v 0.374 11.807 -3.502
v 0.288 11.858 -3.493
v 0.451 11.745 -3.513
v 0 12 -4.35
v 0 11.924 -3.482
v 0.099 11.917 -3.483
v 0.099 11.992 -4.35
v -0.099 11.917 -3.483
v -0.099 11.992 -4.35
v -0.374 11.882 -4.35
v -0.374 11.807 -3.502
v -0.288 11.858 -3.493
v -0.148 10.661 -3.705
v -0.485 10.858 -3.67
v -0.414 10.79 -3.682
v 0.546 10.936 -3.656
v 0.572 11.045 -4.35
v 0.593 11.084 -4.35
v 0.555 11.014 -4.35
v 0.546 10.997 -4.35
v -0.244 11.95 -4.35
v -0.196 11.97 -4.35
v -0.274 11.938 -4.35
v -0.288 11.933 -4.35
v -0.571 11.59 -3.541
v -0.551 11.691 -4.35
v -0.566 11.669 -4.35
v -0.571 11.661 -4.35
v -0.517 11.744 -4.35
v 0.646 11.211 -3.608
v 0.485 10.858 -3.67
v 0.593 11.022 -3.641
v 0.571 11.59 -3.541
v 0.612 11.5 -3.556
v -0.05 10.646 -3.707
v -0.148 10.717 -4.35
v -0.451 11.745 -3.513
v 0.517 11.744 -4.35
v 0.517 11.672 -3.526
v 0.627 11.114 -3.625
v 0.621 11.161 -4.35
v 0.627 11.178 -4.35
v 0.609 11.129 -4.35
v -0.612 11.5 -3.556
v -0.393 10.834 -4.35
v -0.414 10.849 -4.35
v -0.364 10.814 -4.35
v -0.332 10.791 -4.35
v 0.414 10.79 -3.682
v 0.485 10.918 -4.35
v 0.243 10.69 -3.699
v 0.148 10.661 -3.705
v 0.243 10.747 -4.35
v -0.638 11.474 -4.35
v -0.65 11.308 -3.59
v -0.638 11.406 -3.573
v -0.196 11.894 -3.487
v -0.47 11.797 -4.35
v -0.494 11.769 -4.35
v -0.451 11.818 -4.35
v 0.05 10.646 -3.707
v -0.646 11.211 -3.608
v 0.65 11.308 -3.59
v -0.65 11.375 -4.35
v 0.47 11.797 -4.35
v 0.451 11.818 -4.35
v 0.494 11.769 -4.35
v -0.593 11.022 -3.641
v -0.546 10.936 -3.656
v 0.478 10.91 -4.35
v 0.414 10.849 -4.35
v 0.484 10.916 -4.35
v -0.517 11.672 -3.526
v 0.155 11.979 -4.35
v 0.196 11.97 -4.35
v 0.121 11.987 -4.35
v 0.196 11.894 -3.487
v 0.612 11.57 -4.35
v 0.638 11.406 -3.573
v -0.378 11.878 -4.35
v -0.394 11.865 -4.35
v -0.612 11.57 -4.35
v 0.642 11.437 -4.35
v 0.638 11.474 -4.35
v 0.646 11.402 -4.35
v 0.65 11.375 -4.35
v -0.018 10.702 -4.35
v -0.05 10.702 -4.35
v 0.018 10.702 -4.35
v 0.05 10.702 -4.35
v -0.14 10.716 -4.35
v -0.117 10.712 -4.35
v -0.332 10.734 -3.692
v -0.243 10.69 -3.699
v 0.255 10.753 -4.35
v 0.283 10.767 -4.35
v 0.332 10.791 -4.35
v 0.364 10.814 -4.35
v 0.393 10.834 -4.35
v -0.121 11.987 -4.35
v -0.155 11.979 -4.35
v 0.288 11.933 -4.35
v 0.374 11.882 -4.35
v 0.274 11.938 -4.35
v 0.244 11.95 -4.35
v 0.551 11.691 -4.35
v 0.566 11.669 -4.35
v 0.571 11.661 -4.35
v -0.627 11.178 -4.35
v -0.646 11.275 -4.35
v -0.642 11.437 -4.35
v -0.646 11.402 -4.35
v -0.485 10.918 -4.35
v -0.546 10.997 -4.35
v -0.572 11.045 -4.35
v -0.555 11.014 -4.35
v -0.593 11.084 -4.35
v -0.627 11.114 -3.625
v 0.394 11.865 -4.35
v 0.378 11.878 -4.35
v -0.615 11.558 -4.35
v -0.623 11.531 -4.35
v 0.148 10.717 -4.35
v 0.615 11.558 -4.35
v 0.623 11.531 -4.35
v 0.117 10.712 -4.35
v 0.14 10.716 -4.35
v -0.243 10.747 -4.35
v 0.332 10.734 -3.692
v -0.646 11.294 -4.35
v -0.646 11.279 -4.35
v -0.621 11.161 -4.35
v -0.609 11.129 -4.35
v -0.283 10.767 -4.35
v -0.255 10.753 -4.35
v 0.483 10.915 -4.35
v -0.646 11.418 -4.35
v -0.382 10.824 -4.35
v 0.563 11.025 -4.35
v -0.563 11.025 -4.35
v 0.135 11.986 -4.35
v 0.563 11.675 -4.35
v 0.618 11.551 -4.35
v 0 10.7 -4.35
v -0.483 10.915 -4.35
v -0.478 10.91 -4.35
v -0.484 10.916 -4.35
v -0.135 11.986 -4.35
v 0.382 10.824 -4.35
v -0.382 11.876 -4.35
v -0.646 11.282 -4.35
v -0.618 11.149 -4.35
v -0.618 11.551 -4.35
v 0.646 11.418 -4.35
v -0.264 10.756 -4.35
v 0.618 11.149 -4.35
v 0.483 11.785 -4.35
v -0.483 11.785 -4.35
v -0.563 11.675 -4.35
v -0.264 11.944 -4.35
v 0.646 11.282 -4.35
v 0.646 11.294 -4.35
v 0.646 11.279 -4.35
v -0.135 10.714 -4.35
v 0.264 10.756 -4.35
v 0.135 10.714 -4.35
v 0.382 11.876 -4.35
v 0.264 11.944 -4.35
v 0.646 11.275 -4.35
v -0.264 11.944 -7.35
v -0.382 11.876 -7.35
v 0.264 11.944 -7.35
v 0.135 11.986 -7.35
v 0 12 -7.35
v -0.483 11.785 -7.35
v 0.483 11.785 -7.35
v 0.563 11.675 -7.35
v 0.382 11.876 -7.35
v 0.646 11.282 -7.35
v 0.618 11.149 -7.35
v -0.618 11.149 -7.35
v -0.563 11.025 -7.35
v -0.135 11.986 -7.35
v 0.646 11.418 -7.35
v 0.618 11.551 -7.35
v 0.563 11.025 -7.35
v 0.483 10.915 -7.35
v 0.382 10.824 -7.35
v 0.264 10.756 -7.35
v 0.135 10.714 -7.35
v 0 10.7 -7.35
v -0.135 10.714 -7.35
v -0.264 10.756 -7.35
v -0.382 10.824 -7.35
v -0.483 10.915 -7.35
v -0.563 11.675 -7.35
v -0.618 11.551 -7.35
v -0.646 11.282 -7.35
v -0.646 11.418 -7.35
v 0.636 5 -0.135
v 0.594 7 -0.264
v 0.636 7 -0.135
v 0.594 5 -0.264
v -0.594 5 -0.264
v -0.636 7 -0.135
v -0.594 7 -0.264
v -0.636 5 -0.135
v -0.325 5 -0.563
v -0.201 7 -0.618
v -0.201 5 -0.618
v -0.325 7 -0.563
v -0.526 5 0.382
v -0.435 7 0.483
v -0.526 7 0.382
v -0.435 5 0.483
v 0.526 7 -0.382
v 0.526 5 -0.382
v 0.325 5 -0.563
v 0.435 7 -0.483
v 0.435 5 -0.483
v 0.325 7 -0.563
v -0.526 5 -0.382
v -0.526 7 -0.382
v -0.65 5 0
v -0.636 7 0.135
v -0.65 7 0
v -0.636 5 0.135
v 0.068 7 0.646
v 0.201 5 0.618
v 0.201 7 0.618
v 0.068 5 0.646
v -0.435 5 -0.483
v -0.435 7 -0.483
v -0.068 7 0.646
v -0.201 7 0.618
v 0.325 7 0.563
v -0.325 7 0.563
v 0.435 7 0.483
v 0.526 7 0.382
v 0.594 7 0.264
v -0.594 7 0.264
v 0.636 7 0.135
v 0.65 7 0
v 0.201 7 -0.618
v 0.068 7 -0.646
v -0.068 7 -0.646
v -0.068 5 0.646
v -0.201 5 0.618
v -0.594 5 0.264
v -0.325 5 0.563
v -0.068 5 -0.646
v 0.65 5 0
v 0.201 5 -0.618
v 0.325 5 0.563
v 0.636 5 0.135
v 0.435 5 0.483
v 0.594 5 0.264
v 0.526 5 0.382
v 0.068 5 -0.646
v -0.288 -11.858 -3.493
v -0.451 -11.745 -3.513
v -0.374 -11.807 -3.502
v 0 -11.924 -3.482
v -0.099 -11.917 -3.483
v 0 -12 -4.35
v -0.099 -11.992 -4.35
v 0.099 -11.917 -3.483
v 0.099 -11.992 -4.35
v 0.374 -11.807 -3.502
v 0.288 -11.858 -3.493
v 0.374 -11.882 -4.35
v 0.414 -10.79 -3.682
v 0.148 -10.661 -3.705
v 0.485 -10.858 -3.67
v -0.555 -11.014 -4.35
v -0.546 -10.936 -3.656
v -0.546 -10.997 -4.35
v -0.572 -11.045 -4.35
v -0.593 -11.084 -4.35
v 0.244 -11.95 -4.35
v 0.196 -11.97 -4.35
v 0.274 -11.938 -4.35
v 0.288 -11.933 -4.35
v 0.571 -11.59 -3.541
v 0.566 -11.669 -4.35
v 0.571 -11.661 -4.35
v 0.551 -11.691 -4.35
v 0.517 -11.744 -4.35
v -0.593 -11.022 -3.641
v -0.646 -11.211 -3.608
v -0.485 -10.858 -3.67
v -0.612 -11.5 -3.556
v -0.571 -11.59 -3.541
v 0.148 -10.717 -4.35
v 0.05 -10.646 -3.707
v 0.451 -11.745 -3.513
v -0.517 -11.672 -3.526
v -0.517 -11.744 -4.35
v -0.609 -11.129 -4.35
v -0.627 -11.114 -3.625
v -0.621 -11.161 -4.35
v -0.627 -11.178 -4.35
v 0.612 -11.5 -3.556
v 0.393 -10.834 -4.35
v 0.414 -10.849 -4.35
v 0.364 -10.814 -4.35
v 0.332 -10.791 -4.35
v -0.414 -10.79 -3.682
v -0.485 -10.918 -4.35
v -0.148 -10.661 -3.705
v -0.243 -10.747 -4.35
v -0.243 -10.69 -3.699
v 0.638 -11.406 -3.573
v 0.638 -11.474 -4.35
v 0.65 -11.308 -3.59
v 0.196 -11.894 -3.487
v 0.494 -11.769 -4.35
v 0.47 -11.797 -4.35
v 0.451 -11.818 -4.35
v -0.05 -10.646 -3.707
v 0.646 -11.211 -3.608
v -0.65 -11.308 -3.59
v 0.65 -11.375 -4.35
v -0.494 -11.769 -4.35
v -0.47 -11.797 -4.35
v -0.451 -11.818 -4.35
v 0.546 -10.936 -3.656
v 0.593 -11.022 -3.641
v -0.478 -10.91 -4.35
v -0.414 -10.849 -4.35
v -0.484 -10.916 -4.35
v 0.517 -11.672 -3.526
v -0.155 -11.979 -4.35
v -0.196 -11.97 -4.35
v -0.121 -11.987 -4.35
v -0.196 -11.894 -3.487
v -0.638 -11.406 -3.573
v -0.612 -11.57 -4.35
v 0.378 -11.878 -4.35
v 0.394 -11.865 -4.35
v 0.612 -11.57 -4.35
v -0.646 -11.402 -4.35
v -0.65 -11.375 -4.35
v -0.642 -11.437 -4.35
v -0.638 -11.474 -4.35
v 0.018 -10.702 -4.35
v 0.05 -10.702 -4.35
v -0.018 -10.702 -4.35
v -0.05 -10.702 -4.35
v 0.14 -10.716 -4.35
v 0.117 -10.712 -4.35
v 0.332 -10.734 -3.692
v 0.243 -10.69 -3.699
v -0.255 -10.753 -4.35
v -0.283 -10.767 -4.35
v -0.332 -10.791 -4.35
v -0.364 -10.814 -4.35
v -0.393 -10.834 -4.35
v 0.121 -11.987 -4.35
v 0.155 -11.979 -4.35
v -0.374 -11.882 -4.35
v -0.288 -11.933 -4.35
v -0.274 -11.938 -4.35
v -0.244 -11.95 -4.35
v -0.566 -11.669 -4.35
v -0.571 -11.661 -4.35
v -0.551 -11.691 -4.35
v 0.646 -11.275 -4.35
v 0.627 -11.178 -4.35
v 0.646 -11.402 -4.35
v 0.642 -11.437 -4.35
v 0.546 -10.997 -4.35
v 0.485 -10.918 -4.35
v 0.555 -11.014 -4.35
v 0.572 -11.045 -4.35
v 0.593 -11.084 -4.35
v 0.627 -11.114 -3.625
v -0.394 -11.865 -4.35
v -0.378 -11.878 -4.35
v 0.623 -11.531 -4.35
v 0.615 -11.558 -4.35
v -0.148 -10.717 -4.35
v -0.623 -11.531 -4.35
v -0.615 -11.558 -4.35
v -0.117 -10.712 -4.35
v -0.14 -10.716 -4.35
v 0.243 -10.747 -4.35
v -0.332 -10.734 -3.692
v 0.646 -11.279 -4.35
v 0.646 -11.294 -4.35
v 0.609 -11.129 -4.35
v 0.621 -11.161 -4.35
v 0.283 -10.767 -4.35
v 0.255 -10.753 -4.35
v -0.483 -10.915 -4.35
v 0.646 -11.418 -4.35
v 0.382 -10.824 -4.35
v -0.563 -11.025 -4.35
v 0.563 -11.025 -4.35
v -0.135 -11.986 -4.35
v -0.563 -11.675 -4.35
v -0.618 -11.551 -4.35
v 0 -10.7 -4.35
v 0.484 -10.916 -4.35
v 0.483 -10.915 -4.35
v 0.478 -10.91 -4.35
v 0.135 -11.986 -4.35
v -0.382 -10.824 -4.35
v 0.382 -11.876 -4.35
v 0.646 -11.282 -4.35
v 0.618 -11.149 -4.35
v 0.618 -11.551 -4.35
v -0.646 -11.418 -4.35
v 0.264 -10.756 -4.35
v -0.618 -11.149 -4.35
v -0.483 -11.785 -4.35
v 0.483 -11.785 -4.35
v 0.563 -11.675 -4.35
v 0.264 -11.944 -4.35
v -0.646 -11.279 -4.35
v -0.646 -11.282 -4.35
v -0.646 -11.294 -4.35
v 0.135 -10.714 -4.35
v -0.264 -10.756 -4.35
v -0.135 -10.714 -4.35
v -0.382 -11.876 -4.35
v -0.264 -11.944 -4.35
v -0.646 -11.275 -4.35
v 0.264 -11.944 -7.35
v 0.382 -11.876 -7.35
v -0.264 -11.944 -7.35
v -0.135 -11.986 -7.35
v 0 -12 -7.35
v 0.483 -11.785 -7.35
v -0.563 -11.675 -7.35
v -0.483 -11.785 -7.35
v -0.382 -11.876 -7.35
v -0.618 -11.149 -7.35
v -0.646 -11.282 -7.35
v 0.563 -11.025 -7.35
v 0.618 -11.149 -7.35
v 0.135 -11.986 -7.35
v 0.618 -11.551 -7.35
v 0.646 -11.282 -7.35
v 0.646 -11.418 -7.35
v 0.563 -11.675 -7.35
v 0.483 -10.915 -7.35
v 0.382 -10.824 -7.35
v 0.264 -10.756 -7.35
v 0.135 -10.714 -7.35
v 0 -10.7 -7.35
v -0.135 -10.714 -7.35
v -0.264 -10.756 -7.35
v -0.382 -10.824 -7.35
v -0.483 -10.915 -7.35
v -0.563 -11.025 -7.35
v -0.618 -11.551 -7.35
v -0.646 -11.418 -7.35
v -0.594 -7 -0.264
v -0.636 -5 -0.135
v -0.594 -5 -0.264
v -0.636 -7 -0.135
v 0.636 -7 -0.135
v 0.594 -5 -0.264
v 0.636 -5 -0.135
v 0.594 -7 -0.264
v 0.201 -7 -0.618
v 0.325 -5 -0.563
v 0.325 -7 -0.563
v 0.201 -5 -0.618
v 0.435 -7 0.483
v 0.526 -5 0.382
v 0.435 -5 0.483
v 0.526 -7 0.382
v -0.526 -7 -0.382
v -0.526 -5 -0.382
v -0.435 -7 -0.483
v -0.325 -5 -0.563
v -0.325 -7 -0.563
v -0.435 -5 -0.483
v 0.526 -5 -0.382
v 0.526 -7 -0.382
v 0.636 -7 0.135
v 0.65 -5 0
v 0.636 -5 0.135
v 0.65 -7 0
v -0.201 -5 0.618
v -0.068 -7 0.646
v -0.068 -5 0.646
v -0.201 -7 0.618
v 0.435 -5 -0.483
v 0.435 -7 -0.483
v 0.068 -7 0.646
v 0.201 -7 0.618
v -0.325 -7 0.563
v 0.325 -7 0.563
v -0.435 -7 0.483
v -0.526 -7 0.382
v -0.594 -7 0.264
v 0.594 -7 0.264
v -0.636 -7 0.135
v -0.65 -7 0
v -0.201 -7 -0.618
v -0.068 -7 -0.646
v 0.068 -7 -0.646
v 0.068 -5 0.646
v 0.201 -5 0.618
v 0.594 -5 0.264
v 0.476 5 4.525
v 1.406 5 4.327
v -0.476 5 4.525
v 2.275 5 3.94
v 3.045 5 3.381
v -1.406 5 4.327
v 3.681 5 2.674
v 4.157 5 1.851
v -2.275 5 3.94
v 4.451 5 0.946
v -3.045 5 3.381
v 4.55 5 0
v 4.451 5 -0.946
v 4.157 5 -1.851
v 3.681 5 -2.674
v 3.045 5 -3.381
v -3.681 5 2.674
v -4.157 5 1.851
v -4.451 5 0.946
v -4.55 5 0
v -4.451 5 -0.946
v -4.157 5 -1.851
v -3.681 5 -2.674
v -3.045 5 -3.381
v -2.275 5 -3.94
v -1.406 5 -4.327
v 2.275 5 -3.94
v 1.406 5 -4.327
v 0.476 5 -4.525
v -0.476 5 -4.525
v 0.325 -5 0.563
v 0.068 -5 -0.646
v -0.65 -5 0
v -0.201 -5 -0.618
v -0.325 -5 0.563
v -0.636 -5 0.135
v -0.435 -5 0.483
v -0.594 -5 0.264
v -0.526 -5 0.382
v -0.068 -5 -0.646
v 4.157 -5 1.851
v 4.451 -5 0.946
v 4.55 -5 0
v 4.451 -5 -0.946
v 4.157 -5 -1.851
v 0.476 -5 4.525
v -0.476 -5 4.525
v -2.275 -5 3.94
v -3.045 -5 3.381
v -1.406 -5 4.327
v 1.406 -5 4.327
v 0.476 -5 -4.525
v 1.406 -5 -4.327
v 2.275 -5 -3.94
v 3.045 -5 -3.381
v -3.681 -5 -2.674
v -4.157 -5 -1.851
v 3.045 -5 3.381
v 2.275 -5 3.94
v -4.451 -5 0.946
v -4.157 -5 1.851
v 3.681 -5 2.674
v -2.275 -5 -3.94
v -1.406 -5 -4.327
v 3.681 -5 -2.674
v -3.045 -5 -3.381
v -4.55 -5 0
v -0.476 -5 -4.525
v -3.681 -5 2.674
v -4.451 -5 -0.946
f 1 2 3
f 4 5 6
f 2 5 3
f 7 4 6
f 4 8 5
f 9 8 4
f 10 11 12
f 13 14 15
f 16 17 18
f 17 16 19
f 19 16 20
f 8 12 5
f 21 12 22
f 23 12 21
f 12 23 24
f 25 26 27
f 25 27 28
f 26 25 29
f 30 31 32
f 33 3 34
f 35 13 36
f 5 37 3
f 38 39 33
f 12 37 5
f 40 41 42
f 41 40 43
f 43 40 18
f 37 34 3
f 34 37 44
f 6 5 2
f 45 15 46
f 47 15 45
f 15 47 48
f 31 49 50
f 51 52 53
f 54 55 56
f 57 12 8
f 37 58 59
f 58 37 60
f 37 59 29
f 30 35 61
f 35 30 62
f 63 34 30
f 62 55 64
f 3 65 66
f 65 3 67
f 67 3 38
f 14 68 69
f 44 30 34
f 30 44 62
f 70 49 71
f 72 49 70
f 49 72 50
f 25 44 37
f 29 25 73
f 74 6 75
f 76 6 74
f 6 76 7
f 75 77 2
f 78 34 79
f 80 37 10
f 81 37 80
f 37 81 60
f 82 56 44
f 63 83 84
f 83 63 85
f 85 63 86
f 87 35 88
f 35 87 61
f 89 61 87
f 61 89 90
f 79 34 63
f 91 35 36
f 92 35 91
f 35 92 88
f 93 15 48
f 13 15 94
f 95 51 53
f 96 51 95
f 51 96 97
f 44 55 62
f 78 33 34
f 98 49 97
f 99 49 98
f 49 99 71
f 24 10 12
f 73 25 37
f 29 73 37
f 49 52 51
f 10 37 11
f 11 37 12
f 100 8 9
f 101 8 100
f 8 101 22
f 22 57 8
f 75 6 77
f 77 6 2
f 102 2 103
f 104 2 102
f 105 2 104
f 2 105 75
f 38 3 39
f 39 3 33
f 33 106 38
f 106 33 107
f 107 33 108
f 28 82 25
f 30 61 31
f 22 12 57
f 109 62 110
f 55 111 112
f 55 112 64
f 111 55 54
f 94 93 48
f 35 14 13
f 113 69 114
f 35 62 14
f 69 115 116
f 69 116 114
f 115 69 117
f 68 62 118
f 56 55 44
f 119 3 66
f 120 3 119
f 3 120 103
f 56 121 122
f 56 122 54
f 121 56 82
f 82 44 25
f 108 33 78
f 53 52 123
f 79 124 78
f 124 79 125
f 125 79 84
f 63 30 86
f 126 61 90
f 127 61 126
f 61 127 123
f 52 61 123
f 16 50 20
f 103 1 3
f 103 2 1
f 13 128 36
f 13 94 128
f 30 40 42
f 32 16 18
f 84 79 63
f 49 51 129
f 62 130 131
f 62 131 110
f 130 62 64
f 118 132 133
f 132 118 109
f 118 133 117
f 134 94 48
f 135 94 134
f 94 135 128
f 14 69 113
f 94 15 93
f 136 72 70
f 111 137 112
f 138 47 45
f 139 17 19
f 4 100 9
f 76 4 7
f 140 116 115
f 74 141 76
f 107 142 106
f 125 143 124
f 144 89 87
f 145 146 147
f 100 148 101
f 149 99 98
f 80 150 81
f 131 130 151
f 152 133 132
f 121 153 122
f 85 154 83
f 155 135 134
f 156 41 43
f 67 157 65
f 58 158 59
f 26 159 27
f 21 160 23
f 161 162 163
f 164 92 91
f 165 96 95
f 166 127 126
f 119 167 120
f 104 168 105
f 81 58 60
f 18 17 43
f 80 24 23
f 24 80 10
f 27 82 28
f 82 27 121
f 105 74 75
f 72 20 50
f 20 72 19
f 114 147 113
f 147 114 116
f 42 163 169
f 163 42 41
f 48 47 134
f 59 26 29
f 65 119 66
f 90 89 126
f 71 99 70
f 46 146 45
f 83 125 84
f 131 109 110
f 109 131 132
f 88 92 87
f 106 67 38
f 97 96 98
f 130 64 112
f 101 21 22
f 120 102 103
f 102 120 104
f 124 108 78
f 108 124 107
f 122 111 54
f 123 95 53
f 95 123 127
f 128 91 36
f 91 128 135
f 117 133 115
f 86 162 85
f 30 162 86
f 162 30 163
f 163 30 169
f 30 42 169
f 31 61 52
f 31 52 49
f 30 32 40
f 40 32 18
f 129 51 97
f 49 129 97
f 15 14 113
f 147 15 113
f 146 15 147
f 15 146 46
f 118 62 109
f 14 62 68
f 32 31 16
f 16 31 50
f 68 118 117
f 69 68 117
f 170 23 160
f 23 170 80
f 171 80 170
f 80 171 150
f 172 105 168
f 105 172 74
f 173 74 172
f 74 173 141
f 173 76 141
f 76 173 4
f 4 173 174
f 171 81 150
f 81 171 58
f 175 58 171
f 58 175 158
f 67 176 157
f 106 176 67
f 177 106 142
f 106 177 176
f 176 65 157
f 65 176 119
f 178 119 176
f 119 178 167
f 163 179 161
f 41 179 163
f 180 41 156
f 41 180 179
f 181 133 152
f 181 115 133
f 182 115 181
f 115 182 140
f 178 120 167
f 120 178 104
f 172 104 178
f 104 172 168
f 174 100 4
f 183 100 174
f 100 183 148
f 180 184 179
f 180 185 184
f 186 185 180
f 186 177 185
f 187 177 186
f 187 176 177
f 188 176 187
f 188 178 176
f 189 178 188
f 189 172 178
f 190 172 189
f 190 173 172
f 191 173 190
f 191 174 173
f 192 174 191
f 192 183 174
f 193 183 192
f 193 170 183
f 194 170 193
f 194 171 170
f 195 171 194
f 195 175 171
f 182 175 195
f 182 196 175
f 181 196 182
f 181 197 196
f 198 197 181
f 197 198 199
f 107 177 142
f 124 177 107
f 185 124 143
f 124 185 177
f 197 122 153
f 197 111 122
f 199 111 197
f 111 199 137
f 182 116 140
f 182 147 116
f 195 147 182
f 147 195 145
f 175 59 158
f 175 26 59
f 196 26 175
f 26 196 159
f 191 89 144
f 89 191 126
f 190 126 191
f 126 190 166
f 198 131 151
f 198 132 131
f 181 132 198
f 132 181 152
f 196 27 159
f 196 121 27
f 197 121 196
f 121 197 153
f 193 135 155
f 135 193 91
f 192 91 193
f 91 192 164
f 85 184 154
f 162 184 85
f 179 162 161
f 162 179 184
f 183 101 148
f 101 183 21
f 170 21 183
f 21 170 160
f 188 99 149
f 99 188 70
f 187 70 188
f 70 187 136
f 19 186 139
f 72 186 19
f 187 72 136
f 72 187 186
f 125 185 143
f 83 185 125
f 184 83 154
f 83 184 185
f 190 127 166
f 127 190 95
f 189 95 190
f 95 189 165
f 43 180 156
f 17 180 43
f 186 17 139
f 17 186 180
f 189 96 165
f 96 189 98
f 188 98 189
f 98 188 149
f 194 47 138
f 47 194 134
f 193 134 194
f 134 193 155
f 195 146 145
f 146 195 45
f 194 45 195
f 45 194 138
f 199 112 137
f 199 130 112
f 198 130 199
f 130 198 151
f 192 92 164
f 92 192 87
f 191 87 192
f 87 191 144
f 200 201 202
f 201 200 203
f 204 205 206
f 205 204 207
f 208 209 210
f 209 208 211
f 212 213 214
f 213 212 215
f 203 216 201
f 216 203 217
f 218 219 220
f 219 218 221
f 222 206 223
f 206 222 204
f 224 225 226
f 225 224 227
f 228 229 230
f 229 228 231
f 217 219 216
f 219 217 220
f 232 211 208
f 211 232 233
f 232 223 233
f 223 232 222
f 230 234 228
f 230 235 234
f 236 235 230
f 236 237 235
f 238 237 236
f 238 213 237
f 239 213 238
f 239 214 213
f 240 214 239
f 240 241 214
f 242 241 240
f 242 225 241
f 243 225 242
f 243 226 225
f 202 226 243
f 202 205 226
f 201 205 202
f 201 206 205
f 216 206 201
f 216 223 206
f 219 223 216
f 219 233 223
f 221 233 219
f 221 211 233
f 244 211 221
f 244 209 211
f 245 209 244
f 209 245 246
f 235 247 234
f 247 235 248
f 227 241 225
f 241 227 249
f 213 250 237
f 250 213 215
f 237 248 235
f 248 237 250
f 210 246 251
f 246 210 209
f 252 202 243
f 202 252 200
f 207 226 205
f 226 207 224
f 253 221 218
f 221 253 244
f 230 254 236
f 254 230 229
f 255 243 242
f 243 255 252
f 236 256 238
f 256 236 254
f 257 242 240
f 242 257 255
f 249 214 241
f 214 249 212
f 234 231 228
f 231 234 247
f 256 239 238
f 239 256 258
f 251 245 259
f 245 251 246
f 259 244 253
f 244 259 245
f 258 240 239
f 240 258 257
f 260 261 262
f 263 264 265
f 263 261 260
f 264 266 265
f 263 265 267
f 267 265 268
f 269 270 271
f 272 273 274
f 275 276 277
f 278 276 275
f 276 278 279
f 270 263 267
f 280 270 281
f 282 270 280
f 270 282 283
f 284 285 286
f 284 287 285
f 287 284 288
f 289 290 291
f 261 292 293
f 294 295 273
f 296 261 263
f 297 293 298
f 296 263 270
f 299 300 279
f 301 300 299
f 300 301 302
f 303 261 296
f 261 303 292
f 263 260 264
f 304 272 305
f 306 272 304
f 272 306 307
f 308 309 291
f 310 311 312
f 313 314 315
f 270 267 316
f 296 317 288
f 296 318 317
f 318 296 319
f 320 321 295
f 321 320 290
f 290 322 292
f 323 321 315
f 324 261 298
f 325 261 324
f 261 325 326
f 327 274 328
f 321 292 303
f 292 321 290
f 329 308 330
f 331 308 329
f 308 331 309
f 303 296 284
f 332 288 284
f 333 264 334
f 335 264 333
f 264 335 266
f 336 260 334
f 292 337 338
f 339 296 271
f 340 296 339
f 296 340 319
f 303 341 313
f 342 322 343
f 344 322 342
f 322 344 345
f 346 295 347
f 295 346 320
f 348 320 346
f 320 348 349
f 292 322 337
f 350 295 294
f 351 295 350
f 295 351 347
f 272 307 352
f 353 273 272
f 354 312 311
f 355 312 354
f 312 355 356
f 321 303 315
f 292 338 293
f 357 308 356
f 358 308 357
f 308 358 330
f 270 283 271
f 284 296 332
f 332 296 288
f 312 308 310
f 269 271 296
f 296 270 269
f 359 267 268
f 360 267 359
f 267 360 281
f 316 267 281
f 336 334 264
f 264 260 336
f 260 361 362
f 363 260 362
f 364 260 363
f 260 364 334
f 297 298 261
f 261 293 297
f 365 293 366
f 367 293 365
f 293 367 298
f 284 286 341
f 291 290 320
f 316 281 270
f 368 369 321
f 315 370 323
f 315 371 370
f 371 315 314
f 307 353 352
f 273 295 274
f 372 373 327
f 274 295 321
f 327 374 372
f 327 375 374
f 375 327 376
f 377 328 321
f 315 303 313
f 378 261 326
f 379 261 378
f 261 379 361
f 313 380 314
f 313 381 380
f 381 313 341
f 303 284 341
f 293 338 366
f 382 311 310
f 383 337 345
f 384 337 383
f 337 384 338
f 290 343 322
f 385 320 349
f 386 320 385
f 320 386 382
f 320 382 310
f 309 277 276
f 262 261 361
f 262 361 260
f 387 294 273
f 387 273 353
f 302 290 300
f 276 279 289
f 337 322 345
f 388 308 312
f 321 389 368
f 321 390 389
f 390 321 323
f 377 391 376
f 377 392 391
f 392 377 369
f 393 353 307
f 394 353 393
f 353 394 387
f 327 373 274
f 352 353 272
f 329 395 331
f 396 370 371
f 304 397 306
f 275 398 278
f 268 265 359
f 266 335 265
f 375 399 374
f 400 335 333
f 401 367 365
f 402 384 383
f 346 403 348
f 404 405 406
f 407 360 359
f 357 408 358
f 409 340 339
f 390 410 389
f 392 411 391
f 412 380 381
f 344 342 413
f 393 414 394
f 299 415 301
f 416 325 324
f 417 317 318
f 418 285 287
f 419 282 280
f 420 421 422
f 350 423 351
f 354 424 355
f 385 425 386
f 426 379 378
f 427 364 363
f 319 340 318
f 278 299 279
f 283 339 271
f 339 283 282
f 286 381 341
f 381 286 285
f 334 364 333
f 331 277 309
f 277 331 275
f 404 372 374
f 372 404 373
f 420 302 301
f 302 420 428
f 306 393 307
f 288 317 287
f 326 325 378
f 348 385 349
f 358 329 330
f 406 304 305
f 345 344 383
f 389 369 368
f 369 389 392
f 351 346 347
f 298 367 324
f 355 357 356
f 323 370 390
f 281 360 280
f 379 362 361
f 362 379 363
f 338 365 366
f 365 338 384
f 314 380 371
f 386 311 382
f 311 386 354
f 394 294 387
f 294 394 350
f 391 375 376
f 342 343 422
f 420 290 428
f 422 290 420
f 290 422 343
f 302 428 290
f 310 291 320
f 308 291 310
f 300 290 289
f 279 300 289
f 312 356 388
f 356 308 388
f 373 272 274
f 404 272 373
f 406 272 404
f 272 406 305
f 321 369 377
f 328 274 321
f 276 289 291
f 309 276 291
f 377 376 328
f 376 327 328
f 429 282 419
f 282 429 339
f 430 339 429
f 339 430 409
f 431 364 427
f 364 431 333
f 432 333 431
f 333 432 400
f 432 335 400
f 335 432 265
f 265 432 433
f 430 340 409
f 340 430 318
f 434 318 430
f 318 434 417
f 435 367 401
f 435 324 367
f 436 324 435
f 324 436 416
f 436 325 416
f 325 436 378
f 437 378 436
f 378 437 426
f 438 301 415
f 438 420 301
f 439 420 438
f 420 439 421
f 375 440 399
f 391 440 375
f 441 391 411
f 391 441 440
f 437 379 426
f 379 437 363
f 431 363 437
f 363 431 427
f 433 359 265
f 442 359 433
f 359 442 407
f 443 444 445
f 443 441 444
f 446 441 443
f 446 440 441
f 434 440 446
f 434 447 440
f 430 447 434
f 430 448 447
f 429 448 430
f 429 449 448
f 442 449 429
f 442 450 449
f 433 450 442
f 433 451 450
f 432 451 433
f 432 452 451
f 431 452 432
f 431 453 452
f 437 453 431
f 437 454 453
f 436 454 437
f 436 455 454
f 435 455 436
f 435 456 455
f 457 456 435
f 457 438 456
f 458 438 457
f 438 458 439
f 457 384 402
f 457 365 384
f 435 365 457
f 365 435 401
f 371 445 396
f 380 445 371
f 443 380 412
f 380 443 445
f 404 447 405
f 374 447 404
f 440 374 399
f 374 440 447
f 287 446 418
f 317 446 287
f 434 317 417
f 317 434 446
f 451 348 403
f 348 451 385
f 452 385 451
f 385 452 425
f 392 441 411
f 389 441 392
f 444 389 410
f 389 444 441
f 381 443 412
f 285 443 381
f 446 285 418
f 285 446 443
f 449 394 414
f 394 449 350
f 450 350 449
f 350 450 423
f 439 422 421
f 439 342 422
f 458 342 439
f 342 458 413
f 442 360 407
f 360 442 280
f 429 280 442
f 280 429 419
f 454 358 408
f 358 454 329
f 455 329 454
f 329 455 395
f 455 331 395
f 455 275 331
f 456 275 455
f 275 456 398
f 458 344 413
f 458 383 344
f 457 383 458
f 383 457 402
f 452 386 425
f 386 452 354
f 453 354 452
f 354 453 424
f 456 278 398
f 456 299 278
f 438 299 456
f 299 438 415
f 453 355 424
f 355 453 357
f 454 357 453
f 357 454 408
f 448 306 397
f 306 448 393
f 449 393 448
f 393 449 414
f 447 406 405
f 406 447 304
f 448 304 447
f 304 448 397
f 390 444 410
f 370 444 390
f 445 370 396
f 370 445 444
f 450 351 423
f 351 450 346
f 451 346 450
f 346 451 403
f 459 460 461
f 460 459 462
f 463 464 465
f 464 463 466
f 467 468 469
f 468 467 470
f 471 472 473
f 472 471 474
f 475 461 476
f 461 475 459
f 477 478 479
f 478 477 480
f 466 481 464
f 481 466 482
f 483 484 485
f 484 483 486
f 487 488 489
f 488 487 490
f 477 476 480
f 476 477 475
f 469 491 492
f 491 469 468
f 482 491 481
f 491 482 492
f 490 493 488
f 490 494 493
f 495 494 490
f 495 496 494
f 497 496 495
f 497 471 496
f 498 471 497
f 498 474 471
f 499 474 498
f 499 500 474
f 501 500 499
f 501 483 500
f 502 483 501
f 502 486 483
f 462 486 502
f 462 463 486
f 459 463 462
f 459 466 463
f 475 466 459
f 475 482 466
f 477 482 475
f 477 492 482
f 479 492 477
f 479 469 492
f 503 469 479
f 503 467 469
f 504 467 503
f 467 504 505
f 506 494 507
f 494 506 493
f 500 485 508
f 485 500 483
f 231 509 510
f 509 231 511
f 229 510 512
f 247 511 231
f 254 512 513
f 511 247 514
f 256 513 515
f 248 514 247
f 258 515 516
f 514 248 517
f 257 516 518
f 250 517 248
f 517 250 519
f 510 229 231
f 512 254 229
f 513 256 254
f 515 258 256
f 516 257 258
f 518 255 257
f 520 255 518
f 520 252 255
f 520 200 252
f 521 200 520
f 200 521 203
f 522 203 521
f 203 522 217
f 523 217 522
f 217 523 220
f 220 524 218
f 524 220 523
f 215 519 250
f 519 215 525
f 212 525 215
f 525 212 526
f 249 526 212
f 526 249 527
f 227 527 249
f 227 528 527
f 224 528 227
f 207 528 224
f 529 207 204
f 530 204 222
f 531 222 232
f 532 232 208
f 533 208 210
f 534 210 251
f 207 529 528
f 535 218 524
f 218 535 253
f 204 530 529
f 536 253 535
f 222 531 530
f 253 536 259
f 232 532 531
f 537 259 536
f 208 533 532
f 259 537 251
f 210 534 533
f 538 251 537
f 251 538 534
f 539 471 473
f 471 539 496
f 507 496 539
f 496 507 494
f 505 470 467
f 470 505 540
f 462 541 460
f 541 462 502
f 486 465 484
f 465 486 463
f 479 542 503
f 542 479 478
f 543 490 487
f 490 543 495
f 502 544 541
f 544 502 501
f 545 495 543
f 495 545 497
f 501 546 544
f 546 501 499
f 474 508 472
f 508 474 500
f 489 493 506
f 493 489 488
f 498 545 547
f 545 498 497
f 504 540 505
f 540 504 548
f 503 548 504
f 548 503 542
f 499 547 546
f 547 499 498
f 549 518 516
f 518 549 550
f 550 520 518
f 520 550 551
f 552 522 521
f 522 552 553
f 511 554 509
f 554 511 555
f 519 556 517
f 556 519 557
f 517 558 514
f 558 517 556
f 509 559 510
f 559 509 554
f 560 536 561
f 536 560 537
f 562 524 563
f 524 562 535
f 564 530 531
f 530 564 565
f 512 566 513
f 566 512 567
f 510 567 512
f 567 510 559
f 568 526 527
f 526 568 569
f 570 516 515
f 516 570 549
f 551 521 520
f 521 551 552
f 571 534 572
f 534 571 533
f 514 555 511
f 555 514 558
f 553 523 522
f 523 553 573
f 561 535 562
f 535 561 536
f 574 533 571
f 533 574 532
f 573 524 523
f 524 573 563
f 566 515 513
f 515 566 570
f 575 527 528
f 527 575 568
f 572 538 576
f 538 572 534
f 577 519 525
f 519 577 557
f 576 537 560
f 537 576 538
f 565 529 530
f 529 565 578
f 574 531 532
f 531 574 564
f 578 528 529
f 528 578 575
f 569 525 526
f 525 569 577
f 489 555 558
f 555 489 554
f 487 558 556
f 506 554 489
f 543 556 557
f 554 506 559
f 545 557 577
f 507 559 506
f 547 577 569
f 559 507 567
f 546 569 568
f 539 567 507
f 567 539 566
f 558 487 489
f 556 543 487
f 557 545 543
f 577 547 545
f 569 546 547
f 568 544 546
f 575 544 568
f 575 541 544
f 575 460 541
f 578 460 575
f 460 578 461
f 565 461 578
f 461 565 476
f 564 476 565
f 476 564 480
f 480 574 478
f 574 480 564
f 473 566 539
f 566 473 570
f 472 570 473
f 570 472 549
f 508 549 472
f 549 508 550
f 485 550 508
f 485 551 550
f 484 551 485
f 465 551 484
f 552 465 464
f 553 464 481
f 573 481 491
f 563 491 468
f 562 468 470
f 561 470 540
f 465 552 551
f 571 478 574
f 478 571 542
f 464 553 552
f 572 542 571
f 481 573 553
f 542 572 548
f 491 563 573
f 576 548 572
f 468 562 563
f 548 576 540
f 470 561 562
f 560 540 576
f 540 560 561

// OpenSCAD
fludge = 0.1;

module r6() {
    
    cylinder($fs = 0.1, h = 2, d = 9.1);
    translate([0, 0, 2])
    cylinder($fs = 0.1, h = 2, d = 9.1);
    translate([0, 0, 4])
    cylinder($fs = 0.1, h = 6, d = 9.1);
   
}



module lead() {
translate([5 - (1.3 / 2), 0, 0])
rotate([90, 0, 0])
cylinder($fs = 0,1, d = 1.3, h = 3);

translate([-12, 5 - (1.3 / 2), 0])
rotate([0, 90, 0])
cylinder($fs = 0,1, d = 1.3, h = 12);
intersection()
{
translate([0, 0])
   rotate_extrude($fs = 0.1, angle=10, convexity=1)
       translate([5 - 1.3 / 2, 0]) circle($fa = 0,1, $fs = 0.1, d= 1.3);
c = 5;
translate([0, 0, -2.5])
cube([c, c, c]);
}
}

translate([0, 7, - (5 - 1.3 / 2)])
rotate([0, 90, 0])
rotate([0, 0, 90])
lead();

translate([0, -7, - (5 - 1.3 / 2)])
rotate([0, 0, 270])
rotate([90, 0, 0])

lead();
translate([0,5,0])
rotate([90, 0, 0])
r6();
